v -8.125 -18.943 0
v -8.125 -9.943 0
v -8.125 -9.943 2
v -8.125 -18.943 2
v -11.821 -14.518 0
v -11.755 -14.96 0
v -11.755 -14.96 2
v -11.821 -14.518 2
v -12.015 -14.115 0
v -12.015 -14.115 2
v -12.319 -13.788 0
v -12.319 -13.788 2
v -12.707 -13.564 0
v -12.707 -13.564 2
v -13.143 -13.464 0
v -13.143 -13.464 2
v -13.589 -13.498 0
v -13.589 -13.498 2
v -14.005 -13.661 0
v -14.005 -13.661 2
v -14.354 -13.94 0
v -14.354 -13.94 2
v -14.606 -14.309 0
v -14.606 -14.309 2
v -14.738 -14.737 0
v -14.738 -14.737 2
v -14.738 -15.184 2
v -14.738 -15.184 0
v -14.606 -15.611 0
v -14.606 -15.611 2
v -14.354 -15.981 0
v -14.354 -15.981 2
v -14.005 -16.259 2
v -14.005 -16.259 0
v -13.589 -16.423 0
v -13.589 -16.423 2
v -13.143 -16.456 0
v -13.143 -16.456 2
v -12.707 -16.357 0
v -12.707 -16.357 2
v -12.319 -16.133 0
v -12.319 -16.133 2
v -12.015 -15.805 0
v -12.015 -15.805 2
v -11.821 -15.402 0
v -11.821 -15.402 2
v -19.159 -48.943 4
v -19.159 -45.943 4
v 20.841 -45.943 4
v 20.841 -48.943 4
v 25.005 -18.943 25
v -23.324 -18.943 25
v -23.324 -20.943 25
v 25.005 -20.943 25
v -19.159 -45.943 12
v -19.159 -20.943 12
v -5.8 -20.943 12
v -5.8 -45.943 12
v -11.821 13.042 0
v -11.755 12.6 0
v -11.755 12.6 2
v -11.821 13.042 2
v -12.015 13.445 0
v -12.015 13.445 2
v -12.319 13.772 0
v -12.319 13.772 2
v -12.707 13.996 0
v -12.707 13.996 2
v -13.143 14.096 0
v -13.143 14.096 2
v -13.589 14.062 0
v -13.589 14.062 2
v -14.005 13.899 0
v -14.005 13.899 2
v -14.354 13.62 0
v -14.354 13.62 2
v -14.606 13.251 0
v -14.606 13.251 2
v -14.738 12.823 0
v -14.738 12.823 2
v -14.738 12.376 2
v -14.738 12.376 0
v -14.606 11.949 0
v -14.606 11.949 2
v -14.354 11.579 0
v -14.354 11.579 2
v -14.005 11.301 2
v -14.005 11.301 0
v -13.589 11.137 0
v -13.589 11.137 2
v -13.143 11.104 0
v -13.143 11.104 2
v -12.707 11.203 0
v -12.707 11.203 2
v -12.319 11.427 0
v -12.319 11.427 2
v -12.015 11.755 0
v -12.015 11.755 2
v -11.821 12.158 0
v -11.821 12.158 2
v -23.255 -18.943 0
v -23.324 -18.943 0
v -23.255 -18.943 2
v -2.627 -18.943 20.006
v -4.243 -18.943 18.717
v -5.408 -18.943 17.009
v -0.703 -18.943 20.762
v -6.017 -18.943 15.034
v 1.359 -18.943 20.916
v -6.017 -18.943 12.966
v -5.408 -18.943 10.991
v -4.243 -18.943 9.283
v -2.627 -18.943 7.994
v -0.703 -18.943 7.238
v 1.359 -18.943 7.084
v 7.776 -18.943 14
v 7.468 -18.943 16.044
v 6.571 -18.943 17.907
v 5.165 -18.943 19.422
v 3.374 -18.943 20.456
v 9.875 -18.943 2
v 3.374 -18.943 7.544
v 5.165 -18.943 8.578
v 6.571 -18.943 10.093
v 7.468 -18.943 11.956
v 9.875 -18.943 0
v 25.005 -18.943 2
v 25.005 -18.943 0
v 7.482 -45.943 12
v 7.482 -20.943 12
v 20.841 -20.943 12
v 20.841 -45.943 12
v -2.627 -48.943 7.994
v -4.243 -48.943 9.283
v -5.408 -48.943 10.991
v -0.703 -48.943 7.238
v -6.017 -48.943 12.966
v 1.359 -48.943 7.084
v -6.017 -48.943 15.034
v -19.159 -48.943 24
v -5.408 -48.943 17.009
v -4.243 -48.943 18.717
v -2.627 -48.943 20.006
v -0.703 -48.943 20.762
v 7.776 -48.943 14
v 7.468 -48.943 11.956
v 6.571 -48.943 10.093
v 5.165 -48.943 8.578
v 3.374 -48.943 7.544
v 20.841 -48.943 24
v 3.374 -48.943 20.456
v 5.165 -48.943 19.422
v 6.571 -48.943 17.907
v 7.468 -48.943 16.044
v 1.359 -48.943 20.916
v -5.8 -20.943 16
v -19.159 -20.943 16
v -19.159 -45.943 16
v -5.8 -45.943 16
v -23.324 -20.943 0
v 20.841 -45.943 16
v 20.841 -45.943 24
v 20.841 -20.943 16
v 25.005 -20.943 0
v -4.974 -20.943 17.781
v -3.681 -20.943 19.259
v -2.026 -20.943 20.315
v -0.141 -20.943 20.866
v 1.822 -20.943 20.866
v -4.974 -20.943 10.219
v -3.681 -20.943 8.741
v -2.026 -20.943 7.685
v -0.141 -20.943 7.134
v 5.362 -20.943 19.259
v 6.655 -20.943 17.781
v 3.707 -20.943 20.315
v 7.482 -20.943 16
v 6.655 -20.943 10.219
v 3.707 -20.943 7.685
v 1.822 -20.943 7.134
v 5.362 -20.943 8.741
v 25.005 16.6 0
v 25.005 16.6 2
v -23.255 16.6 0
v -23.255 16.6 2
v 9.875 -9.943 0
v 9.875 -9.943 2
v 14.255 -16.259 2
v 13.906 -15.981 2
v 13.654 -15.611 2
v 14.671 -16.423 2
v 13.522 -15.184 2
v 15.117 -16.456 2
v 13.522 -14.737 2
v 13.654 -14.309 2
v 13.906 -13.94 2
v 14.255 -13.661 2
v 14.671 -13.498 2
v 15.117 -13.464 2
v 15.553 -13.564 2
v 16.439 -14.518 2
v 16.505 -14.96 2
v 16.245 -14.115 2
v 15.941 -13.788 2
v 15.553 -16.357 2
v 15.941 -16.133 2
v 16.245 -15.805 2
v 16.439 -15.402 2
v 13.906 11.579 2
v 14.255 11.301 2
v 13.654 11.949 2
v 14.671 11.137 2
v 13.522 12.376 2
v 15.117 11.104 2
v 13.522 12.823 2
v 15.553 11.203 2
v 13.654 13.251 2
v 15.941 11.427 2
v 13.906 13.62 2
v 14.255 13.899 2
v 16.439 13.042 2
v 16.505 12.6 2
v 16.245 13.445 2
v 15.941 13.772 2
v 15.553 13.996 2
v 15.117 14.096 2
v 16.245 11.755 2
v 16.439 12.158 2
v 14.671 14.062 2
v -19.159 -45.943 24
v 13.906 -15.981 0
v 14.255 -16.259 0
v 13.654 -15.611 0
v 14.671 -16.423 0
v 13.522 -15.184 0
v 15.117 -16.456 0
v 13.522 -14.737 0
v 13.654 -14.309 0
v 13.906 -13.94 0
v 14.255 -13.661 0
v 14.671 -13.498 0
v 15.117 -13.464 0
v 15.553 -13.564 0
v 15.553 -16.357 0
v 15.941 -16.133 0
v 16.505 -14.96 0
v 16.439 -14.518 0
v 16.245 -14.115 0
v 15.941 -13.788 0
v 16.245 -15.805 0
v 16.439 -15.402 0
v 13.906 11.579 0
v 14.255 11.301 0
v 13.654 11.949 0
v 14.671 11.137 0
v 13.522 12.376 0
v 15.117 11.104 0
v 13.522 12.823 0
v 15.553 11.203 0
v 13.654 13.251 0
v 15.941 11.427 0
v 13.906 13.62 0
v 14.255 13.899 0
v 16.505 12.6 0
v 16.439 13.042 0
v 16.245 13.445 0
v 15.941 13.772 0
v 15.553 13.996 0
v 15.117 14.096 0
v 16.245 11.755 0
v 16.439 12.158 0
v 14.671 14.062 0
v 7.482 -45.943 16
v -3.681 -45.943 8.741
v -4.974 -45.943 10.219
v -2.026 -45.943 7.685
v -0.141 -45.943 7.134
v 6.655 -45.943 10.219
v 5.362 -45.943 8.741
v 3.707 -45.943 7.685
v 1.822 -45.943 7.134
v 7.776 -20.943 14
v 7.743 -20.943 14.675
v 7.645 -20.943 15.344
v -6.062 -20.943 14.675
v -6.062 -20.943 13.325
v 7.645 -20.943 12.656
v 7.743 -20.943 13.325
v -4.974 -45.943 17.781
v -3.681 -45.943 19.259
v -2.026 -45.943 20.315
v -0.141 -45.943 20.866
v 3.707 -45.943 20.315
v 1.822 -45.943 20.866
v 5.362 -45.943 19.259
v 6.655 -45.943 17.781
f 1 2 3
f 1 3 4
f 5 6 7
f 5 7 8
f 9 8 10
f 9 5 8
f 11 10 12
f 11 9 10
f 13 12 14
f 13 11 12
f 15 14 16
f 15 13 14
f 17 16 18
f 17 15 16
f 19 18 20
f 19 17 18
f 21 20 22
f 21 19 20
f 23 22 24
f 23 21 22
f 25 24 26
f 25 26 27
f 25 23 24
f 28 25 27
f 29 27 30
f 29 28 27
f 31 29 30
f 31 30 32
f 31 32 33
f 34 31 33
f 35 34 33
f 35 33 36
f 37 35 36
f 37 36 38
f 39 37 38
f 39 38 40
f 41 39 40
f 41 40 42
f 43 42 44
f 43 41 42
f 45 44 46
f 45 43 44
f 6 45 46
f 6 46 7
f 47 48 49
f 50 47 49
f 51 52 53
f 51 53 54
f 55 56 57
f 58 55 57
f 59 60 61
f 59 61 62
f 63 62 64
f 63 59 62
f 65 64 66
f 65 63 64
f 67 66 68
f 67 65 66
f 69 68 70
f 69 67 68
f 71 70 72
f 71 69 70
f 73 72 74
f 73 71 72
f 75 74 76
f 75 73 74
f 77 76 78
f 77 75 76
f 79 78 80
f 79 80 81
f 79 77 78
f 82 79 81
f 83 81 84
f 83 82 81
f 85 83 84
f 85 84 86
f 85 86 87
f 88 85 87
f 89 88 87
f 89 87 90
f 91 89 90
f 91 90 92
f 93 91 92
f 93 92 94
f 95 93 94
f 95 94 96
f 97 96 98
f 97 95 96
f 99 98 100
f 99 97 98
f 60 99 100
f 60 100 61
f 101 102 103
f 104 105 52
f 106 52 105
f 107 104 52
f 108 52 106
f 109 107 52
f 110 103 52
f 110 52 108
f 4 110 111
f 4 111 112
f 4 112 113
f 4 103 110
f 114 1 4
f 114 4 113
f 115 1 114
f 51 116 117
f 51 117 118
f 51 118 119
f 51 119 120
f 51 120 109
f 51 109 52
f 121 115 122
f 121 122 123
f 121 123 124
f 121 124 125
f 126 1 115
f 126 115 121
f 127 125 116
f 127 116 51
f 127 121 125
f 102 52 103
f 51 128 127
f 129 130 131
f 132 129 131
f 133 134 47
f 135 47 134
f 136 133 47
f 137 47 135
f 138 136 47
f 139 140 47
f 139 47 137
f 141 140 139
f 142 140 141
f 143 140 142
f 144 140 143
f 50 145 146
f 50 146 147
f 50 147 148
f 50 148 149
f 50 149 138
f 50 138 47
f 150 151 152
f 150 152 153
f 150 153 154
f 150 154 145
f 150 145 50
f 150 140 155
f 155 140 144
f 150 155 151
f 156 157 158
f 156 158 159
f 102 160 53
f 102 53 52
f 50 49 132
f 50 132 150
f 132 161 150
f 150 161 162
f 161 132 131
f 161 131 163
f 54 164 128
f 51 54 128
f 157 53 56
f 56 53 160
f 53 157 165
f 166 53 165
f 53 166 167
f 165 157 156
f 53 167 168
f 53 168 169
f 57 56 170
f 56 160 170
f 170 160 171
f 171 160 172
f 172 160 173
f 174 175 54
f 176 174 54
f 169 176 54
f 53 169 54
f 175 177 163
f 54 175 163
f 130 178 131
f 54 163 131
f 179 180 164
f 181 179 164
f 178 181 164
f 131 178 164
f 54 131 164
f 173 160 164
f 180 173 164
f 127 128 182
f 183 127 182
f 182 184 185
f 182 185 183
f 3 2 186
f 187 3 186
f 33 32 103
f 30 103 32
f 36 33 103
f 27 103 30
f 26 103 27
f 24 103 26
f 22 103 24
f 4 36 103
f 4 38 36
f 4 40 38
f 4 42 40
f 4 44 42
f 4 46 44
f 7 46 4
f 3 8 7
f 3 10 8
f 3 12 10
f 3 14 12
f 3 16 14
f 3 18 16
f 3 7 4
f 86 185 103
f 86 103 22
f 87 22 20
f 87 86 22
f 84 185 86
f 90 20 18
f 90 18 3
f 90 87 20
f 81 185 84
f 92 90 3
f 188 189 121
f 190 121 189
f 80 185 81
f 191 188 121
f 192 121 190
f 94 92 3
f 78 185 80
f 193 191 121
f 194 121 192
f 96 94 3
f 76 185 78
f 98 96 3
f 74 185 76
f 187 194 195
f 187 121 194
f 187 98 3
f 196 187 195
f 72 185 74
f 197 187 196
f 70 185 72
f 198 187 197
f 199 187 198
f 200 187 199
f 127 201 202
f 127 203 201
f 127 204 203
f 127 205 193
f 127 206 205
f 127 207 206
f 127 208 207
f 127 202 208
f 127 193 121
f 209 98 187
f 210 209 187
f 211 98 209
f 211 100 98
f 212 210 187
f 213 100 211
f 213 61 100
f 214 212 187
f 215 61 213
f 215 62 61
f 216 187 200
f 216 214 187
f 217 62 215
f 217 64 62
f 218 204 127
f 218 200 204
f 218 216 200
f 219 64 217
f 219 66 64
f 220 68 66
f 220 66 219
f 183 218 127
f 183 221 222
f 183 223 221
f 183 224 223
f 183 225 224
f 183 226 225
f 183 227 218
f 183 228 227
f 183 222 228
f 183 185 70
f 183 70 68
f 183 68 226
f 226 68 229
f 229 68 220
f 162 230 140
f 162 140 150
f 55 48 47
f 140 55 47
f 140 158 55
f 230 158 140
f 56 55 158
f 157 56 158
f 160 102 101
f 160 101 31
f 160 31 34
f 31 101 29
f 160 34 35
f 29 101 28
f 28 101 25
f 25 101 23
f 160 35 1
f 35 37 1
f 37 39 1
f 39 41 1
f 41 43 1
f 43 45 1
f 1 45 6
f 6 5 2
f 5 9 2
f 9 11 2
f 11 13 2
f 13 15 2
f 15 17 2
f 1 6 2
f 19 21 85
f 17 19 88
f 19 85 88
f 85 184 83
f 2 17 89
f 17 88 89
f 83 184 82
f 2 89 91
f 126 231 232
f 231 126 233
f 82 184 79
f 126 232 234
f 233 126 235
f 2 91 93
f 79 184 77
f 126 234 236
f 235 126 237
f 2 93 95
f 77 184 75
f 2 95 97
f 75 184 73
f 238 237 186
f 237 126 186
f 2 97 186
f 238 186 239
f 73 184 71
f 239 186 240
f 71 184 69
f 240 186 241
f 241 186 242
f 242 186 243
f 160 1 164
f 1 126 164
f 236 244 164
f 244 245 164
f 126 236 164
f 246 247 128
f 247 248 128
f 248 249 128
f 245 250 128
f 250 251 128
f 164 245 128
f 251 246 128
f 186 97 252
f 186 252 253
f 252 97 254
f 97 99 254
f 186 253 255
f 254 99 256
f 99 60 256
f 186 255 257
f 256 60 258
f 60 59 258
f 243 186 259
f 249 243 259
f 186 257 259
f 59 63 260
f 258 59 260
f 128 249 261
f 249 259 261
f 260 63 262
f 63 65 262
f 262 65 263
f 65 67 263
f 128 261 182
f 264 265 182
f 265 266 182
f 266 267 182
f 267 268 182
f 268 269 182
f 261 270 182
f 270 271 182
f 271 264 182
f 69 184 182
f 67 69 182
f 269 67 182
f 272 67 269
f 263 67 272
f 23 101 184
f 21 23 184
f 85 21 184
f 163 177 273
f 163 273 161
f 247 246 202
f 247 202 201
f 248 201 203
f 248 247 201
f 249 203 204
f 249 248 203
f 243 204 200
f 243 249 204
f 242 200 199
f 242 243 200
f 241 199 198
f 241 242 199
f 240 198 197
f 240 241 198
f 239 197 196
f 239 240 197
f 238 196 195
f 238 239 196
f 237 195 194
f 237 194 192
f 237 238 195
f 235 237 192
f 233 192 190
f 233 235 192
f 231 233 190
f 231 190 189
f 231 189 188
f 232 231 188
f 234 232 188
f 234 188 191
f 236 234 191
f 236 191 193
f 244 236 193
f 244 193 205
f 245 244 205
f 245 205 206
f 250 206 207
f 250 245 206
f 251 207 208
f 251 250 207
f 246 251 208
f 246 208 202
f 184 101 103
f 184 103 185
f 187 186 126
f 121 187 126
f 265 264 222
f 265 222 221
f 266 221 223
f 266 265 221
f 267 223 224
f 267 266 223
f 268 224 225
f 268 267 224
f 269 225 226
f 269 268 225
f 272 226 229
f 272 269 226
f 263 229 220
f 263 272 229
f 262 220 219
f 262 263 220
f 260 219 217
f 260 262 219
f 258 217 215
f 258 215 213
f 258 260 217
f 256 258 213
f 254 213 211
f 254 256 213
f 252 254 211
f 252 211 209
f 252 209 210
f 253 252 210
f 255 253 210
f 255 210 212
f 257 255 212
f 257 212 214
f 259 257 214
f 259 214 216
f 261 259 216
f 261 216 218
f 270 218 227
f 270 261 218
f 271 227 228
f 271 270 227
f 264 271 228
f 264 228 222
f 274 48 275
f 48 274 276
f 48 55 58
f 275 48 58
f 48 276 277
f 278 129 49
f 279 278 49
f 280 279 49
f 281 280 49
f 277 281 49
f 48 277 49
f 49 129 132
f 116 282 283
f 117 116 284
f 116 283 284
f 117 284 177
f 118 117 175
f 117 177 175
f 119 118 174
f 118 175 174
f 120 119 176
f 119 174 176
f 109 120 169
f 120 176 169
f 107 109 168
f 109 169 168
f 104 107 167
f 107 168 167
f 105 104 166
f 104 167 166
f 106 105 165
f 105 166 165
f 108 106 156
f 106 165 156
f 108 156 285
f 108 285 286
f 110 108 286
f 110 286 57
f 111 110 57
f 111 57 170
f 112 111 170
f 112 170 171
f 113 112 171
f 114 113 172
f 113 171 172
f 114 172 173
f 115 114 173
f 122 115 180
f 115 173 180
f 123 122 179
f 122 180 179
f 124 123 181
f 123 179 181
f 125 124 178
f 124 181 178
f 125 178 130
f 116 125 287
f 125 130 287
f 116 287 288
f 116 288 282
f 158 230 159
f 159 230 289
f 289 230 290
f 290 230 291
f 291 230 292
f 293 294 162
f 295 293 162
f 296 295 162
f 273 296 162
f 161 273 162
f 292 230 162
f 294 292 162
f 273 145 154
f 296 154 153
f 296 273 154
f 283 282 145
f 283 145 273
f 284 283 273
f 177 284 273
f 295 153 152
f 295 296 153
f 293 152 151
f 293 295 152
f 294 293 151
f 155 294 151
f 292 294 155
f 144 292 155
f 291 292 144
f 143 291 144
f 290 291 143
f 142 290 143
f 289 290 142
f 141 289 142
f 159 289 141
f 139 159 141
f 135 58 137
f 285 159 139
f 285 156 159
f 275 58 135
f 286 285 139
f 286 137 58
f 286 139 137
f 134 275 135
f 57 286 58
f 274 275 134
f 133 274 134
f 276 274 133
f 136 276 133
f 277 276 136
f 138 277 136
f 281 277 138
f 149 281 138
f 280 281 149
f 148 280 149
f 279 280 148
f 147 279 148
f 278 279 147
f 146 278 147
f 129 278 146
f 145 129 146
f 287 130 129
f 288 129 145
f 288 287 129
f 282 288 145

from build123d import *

# Parameters (mm, degrees)
F0_W      = 48.26
F0_H      = 35.56
F0_R      = 1.5
F1_DEPTH  = 2
F2_W      = 48.329203
F2_H      = 2
F3_DEPTH  = 25
F5_W      = 18
F5_H      = 9
F6_DEPTH  = 25
F7_W      = 40
F7_H      = 4
F8_DEPTH  = 25
F9_W      = 40
F9_H      = 20
F10_DEPTH = 3
F11_R     = 6.935469
F12_DEPTH = 30
F13_DEPTH = 25


with BuildPart() as f1:
    # F0 (on Top) → F1 (new body)
    with BuildSketch(Plane.XY):
        with Locations((0.875274, -1.180254)):
            Rectangle(F0_W, F0_H)
        with Locations((-13.254726, -14.960254)):
            Circle(F0_R, mode=Mode.SUBTRACT)
        with Locations((15.005274, -14.960254)):
            Circle(F0_R, mode=Mode.SUBTRACT)
        with Locations((-13.254726, 12.599746)):
            Circle(F0_R, mode=Mode.SUBTRACT)
        with Locations((15.005274, 12.599746)):
            Circle(F0_R, mode=Mode.SUBTRACT)
    extrude(amount=F1_DEPTH)

    # F2 (on Top) → F3 (join)
    with BuildSketch(Plane.XY):
        with Locations((0.840673, -19.942636)):
            Rectangle(F2_W, F2_H)
    extrude(amount=F3_DEPTH)

    # F5 (on face) → F6 (cut)
    with BuildSketch(Plane(origin=(0, 0, 0), x_dir=(1, 0, 0), z_dir=(0, 0, -1))):
        with Locations((0.875274, 14.442636)):
            Rectangle(F5_W, F5_H)
    extrude(amount=-F6_DEPTH, mode=Mode.SUBTRACT)

    # F7 (on face) → F8 (join)
    with BuildSketch(Plane.XZ.offset(20.942636)):
        with Locations((0.840672, 14)):
            Rectangle(F7_W, F7_H)
    extrude(amount=F8_DEPTH)

    # F9 (on face) → F10 (join)
    with BuildSketch(Plane.XZ.offset(45.942636)):
        with Locations((0.840672, 14)):
            Rectangle(F9_W, F9_H)
    extrude(amount=F10_DEPTH)

    # F11 (on face) → F12 (cut)
    with BuildSketch(Plane.XZ.offset(20.942636)):
        with Locations((0.840672, 14)):
            Circle(F11_R)
    extrude(amount=F12_DEPTH, mode=Mode.SUBTRACT)

    # F11 (on face) → F13 (cut)
    with BuildSketch(Plane.XZ.offset(20.942636)):
        with Locations((0.840672, 14)):
            Circle(F11_R)
    extrude(amount=-F13_DEPTH, mode=Mode.SUBTRACT)


solid = f1.part
